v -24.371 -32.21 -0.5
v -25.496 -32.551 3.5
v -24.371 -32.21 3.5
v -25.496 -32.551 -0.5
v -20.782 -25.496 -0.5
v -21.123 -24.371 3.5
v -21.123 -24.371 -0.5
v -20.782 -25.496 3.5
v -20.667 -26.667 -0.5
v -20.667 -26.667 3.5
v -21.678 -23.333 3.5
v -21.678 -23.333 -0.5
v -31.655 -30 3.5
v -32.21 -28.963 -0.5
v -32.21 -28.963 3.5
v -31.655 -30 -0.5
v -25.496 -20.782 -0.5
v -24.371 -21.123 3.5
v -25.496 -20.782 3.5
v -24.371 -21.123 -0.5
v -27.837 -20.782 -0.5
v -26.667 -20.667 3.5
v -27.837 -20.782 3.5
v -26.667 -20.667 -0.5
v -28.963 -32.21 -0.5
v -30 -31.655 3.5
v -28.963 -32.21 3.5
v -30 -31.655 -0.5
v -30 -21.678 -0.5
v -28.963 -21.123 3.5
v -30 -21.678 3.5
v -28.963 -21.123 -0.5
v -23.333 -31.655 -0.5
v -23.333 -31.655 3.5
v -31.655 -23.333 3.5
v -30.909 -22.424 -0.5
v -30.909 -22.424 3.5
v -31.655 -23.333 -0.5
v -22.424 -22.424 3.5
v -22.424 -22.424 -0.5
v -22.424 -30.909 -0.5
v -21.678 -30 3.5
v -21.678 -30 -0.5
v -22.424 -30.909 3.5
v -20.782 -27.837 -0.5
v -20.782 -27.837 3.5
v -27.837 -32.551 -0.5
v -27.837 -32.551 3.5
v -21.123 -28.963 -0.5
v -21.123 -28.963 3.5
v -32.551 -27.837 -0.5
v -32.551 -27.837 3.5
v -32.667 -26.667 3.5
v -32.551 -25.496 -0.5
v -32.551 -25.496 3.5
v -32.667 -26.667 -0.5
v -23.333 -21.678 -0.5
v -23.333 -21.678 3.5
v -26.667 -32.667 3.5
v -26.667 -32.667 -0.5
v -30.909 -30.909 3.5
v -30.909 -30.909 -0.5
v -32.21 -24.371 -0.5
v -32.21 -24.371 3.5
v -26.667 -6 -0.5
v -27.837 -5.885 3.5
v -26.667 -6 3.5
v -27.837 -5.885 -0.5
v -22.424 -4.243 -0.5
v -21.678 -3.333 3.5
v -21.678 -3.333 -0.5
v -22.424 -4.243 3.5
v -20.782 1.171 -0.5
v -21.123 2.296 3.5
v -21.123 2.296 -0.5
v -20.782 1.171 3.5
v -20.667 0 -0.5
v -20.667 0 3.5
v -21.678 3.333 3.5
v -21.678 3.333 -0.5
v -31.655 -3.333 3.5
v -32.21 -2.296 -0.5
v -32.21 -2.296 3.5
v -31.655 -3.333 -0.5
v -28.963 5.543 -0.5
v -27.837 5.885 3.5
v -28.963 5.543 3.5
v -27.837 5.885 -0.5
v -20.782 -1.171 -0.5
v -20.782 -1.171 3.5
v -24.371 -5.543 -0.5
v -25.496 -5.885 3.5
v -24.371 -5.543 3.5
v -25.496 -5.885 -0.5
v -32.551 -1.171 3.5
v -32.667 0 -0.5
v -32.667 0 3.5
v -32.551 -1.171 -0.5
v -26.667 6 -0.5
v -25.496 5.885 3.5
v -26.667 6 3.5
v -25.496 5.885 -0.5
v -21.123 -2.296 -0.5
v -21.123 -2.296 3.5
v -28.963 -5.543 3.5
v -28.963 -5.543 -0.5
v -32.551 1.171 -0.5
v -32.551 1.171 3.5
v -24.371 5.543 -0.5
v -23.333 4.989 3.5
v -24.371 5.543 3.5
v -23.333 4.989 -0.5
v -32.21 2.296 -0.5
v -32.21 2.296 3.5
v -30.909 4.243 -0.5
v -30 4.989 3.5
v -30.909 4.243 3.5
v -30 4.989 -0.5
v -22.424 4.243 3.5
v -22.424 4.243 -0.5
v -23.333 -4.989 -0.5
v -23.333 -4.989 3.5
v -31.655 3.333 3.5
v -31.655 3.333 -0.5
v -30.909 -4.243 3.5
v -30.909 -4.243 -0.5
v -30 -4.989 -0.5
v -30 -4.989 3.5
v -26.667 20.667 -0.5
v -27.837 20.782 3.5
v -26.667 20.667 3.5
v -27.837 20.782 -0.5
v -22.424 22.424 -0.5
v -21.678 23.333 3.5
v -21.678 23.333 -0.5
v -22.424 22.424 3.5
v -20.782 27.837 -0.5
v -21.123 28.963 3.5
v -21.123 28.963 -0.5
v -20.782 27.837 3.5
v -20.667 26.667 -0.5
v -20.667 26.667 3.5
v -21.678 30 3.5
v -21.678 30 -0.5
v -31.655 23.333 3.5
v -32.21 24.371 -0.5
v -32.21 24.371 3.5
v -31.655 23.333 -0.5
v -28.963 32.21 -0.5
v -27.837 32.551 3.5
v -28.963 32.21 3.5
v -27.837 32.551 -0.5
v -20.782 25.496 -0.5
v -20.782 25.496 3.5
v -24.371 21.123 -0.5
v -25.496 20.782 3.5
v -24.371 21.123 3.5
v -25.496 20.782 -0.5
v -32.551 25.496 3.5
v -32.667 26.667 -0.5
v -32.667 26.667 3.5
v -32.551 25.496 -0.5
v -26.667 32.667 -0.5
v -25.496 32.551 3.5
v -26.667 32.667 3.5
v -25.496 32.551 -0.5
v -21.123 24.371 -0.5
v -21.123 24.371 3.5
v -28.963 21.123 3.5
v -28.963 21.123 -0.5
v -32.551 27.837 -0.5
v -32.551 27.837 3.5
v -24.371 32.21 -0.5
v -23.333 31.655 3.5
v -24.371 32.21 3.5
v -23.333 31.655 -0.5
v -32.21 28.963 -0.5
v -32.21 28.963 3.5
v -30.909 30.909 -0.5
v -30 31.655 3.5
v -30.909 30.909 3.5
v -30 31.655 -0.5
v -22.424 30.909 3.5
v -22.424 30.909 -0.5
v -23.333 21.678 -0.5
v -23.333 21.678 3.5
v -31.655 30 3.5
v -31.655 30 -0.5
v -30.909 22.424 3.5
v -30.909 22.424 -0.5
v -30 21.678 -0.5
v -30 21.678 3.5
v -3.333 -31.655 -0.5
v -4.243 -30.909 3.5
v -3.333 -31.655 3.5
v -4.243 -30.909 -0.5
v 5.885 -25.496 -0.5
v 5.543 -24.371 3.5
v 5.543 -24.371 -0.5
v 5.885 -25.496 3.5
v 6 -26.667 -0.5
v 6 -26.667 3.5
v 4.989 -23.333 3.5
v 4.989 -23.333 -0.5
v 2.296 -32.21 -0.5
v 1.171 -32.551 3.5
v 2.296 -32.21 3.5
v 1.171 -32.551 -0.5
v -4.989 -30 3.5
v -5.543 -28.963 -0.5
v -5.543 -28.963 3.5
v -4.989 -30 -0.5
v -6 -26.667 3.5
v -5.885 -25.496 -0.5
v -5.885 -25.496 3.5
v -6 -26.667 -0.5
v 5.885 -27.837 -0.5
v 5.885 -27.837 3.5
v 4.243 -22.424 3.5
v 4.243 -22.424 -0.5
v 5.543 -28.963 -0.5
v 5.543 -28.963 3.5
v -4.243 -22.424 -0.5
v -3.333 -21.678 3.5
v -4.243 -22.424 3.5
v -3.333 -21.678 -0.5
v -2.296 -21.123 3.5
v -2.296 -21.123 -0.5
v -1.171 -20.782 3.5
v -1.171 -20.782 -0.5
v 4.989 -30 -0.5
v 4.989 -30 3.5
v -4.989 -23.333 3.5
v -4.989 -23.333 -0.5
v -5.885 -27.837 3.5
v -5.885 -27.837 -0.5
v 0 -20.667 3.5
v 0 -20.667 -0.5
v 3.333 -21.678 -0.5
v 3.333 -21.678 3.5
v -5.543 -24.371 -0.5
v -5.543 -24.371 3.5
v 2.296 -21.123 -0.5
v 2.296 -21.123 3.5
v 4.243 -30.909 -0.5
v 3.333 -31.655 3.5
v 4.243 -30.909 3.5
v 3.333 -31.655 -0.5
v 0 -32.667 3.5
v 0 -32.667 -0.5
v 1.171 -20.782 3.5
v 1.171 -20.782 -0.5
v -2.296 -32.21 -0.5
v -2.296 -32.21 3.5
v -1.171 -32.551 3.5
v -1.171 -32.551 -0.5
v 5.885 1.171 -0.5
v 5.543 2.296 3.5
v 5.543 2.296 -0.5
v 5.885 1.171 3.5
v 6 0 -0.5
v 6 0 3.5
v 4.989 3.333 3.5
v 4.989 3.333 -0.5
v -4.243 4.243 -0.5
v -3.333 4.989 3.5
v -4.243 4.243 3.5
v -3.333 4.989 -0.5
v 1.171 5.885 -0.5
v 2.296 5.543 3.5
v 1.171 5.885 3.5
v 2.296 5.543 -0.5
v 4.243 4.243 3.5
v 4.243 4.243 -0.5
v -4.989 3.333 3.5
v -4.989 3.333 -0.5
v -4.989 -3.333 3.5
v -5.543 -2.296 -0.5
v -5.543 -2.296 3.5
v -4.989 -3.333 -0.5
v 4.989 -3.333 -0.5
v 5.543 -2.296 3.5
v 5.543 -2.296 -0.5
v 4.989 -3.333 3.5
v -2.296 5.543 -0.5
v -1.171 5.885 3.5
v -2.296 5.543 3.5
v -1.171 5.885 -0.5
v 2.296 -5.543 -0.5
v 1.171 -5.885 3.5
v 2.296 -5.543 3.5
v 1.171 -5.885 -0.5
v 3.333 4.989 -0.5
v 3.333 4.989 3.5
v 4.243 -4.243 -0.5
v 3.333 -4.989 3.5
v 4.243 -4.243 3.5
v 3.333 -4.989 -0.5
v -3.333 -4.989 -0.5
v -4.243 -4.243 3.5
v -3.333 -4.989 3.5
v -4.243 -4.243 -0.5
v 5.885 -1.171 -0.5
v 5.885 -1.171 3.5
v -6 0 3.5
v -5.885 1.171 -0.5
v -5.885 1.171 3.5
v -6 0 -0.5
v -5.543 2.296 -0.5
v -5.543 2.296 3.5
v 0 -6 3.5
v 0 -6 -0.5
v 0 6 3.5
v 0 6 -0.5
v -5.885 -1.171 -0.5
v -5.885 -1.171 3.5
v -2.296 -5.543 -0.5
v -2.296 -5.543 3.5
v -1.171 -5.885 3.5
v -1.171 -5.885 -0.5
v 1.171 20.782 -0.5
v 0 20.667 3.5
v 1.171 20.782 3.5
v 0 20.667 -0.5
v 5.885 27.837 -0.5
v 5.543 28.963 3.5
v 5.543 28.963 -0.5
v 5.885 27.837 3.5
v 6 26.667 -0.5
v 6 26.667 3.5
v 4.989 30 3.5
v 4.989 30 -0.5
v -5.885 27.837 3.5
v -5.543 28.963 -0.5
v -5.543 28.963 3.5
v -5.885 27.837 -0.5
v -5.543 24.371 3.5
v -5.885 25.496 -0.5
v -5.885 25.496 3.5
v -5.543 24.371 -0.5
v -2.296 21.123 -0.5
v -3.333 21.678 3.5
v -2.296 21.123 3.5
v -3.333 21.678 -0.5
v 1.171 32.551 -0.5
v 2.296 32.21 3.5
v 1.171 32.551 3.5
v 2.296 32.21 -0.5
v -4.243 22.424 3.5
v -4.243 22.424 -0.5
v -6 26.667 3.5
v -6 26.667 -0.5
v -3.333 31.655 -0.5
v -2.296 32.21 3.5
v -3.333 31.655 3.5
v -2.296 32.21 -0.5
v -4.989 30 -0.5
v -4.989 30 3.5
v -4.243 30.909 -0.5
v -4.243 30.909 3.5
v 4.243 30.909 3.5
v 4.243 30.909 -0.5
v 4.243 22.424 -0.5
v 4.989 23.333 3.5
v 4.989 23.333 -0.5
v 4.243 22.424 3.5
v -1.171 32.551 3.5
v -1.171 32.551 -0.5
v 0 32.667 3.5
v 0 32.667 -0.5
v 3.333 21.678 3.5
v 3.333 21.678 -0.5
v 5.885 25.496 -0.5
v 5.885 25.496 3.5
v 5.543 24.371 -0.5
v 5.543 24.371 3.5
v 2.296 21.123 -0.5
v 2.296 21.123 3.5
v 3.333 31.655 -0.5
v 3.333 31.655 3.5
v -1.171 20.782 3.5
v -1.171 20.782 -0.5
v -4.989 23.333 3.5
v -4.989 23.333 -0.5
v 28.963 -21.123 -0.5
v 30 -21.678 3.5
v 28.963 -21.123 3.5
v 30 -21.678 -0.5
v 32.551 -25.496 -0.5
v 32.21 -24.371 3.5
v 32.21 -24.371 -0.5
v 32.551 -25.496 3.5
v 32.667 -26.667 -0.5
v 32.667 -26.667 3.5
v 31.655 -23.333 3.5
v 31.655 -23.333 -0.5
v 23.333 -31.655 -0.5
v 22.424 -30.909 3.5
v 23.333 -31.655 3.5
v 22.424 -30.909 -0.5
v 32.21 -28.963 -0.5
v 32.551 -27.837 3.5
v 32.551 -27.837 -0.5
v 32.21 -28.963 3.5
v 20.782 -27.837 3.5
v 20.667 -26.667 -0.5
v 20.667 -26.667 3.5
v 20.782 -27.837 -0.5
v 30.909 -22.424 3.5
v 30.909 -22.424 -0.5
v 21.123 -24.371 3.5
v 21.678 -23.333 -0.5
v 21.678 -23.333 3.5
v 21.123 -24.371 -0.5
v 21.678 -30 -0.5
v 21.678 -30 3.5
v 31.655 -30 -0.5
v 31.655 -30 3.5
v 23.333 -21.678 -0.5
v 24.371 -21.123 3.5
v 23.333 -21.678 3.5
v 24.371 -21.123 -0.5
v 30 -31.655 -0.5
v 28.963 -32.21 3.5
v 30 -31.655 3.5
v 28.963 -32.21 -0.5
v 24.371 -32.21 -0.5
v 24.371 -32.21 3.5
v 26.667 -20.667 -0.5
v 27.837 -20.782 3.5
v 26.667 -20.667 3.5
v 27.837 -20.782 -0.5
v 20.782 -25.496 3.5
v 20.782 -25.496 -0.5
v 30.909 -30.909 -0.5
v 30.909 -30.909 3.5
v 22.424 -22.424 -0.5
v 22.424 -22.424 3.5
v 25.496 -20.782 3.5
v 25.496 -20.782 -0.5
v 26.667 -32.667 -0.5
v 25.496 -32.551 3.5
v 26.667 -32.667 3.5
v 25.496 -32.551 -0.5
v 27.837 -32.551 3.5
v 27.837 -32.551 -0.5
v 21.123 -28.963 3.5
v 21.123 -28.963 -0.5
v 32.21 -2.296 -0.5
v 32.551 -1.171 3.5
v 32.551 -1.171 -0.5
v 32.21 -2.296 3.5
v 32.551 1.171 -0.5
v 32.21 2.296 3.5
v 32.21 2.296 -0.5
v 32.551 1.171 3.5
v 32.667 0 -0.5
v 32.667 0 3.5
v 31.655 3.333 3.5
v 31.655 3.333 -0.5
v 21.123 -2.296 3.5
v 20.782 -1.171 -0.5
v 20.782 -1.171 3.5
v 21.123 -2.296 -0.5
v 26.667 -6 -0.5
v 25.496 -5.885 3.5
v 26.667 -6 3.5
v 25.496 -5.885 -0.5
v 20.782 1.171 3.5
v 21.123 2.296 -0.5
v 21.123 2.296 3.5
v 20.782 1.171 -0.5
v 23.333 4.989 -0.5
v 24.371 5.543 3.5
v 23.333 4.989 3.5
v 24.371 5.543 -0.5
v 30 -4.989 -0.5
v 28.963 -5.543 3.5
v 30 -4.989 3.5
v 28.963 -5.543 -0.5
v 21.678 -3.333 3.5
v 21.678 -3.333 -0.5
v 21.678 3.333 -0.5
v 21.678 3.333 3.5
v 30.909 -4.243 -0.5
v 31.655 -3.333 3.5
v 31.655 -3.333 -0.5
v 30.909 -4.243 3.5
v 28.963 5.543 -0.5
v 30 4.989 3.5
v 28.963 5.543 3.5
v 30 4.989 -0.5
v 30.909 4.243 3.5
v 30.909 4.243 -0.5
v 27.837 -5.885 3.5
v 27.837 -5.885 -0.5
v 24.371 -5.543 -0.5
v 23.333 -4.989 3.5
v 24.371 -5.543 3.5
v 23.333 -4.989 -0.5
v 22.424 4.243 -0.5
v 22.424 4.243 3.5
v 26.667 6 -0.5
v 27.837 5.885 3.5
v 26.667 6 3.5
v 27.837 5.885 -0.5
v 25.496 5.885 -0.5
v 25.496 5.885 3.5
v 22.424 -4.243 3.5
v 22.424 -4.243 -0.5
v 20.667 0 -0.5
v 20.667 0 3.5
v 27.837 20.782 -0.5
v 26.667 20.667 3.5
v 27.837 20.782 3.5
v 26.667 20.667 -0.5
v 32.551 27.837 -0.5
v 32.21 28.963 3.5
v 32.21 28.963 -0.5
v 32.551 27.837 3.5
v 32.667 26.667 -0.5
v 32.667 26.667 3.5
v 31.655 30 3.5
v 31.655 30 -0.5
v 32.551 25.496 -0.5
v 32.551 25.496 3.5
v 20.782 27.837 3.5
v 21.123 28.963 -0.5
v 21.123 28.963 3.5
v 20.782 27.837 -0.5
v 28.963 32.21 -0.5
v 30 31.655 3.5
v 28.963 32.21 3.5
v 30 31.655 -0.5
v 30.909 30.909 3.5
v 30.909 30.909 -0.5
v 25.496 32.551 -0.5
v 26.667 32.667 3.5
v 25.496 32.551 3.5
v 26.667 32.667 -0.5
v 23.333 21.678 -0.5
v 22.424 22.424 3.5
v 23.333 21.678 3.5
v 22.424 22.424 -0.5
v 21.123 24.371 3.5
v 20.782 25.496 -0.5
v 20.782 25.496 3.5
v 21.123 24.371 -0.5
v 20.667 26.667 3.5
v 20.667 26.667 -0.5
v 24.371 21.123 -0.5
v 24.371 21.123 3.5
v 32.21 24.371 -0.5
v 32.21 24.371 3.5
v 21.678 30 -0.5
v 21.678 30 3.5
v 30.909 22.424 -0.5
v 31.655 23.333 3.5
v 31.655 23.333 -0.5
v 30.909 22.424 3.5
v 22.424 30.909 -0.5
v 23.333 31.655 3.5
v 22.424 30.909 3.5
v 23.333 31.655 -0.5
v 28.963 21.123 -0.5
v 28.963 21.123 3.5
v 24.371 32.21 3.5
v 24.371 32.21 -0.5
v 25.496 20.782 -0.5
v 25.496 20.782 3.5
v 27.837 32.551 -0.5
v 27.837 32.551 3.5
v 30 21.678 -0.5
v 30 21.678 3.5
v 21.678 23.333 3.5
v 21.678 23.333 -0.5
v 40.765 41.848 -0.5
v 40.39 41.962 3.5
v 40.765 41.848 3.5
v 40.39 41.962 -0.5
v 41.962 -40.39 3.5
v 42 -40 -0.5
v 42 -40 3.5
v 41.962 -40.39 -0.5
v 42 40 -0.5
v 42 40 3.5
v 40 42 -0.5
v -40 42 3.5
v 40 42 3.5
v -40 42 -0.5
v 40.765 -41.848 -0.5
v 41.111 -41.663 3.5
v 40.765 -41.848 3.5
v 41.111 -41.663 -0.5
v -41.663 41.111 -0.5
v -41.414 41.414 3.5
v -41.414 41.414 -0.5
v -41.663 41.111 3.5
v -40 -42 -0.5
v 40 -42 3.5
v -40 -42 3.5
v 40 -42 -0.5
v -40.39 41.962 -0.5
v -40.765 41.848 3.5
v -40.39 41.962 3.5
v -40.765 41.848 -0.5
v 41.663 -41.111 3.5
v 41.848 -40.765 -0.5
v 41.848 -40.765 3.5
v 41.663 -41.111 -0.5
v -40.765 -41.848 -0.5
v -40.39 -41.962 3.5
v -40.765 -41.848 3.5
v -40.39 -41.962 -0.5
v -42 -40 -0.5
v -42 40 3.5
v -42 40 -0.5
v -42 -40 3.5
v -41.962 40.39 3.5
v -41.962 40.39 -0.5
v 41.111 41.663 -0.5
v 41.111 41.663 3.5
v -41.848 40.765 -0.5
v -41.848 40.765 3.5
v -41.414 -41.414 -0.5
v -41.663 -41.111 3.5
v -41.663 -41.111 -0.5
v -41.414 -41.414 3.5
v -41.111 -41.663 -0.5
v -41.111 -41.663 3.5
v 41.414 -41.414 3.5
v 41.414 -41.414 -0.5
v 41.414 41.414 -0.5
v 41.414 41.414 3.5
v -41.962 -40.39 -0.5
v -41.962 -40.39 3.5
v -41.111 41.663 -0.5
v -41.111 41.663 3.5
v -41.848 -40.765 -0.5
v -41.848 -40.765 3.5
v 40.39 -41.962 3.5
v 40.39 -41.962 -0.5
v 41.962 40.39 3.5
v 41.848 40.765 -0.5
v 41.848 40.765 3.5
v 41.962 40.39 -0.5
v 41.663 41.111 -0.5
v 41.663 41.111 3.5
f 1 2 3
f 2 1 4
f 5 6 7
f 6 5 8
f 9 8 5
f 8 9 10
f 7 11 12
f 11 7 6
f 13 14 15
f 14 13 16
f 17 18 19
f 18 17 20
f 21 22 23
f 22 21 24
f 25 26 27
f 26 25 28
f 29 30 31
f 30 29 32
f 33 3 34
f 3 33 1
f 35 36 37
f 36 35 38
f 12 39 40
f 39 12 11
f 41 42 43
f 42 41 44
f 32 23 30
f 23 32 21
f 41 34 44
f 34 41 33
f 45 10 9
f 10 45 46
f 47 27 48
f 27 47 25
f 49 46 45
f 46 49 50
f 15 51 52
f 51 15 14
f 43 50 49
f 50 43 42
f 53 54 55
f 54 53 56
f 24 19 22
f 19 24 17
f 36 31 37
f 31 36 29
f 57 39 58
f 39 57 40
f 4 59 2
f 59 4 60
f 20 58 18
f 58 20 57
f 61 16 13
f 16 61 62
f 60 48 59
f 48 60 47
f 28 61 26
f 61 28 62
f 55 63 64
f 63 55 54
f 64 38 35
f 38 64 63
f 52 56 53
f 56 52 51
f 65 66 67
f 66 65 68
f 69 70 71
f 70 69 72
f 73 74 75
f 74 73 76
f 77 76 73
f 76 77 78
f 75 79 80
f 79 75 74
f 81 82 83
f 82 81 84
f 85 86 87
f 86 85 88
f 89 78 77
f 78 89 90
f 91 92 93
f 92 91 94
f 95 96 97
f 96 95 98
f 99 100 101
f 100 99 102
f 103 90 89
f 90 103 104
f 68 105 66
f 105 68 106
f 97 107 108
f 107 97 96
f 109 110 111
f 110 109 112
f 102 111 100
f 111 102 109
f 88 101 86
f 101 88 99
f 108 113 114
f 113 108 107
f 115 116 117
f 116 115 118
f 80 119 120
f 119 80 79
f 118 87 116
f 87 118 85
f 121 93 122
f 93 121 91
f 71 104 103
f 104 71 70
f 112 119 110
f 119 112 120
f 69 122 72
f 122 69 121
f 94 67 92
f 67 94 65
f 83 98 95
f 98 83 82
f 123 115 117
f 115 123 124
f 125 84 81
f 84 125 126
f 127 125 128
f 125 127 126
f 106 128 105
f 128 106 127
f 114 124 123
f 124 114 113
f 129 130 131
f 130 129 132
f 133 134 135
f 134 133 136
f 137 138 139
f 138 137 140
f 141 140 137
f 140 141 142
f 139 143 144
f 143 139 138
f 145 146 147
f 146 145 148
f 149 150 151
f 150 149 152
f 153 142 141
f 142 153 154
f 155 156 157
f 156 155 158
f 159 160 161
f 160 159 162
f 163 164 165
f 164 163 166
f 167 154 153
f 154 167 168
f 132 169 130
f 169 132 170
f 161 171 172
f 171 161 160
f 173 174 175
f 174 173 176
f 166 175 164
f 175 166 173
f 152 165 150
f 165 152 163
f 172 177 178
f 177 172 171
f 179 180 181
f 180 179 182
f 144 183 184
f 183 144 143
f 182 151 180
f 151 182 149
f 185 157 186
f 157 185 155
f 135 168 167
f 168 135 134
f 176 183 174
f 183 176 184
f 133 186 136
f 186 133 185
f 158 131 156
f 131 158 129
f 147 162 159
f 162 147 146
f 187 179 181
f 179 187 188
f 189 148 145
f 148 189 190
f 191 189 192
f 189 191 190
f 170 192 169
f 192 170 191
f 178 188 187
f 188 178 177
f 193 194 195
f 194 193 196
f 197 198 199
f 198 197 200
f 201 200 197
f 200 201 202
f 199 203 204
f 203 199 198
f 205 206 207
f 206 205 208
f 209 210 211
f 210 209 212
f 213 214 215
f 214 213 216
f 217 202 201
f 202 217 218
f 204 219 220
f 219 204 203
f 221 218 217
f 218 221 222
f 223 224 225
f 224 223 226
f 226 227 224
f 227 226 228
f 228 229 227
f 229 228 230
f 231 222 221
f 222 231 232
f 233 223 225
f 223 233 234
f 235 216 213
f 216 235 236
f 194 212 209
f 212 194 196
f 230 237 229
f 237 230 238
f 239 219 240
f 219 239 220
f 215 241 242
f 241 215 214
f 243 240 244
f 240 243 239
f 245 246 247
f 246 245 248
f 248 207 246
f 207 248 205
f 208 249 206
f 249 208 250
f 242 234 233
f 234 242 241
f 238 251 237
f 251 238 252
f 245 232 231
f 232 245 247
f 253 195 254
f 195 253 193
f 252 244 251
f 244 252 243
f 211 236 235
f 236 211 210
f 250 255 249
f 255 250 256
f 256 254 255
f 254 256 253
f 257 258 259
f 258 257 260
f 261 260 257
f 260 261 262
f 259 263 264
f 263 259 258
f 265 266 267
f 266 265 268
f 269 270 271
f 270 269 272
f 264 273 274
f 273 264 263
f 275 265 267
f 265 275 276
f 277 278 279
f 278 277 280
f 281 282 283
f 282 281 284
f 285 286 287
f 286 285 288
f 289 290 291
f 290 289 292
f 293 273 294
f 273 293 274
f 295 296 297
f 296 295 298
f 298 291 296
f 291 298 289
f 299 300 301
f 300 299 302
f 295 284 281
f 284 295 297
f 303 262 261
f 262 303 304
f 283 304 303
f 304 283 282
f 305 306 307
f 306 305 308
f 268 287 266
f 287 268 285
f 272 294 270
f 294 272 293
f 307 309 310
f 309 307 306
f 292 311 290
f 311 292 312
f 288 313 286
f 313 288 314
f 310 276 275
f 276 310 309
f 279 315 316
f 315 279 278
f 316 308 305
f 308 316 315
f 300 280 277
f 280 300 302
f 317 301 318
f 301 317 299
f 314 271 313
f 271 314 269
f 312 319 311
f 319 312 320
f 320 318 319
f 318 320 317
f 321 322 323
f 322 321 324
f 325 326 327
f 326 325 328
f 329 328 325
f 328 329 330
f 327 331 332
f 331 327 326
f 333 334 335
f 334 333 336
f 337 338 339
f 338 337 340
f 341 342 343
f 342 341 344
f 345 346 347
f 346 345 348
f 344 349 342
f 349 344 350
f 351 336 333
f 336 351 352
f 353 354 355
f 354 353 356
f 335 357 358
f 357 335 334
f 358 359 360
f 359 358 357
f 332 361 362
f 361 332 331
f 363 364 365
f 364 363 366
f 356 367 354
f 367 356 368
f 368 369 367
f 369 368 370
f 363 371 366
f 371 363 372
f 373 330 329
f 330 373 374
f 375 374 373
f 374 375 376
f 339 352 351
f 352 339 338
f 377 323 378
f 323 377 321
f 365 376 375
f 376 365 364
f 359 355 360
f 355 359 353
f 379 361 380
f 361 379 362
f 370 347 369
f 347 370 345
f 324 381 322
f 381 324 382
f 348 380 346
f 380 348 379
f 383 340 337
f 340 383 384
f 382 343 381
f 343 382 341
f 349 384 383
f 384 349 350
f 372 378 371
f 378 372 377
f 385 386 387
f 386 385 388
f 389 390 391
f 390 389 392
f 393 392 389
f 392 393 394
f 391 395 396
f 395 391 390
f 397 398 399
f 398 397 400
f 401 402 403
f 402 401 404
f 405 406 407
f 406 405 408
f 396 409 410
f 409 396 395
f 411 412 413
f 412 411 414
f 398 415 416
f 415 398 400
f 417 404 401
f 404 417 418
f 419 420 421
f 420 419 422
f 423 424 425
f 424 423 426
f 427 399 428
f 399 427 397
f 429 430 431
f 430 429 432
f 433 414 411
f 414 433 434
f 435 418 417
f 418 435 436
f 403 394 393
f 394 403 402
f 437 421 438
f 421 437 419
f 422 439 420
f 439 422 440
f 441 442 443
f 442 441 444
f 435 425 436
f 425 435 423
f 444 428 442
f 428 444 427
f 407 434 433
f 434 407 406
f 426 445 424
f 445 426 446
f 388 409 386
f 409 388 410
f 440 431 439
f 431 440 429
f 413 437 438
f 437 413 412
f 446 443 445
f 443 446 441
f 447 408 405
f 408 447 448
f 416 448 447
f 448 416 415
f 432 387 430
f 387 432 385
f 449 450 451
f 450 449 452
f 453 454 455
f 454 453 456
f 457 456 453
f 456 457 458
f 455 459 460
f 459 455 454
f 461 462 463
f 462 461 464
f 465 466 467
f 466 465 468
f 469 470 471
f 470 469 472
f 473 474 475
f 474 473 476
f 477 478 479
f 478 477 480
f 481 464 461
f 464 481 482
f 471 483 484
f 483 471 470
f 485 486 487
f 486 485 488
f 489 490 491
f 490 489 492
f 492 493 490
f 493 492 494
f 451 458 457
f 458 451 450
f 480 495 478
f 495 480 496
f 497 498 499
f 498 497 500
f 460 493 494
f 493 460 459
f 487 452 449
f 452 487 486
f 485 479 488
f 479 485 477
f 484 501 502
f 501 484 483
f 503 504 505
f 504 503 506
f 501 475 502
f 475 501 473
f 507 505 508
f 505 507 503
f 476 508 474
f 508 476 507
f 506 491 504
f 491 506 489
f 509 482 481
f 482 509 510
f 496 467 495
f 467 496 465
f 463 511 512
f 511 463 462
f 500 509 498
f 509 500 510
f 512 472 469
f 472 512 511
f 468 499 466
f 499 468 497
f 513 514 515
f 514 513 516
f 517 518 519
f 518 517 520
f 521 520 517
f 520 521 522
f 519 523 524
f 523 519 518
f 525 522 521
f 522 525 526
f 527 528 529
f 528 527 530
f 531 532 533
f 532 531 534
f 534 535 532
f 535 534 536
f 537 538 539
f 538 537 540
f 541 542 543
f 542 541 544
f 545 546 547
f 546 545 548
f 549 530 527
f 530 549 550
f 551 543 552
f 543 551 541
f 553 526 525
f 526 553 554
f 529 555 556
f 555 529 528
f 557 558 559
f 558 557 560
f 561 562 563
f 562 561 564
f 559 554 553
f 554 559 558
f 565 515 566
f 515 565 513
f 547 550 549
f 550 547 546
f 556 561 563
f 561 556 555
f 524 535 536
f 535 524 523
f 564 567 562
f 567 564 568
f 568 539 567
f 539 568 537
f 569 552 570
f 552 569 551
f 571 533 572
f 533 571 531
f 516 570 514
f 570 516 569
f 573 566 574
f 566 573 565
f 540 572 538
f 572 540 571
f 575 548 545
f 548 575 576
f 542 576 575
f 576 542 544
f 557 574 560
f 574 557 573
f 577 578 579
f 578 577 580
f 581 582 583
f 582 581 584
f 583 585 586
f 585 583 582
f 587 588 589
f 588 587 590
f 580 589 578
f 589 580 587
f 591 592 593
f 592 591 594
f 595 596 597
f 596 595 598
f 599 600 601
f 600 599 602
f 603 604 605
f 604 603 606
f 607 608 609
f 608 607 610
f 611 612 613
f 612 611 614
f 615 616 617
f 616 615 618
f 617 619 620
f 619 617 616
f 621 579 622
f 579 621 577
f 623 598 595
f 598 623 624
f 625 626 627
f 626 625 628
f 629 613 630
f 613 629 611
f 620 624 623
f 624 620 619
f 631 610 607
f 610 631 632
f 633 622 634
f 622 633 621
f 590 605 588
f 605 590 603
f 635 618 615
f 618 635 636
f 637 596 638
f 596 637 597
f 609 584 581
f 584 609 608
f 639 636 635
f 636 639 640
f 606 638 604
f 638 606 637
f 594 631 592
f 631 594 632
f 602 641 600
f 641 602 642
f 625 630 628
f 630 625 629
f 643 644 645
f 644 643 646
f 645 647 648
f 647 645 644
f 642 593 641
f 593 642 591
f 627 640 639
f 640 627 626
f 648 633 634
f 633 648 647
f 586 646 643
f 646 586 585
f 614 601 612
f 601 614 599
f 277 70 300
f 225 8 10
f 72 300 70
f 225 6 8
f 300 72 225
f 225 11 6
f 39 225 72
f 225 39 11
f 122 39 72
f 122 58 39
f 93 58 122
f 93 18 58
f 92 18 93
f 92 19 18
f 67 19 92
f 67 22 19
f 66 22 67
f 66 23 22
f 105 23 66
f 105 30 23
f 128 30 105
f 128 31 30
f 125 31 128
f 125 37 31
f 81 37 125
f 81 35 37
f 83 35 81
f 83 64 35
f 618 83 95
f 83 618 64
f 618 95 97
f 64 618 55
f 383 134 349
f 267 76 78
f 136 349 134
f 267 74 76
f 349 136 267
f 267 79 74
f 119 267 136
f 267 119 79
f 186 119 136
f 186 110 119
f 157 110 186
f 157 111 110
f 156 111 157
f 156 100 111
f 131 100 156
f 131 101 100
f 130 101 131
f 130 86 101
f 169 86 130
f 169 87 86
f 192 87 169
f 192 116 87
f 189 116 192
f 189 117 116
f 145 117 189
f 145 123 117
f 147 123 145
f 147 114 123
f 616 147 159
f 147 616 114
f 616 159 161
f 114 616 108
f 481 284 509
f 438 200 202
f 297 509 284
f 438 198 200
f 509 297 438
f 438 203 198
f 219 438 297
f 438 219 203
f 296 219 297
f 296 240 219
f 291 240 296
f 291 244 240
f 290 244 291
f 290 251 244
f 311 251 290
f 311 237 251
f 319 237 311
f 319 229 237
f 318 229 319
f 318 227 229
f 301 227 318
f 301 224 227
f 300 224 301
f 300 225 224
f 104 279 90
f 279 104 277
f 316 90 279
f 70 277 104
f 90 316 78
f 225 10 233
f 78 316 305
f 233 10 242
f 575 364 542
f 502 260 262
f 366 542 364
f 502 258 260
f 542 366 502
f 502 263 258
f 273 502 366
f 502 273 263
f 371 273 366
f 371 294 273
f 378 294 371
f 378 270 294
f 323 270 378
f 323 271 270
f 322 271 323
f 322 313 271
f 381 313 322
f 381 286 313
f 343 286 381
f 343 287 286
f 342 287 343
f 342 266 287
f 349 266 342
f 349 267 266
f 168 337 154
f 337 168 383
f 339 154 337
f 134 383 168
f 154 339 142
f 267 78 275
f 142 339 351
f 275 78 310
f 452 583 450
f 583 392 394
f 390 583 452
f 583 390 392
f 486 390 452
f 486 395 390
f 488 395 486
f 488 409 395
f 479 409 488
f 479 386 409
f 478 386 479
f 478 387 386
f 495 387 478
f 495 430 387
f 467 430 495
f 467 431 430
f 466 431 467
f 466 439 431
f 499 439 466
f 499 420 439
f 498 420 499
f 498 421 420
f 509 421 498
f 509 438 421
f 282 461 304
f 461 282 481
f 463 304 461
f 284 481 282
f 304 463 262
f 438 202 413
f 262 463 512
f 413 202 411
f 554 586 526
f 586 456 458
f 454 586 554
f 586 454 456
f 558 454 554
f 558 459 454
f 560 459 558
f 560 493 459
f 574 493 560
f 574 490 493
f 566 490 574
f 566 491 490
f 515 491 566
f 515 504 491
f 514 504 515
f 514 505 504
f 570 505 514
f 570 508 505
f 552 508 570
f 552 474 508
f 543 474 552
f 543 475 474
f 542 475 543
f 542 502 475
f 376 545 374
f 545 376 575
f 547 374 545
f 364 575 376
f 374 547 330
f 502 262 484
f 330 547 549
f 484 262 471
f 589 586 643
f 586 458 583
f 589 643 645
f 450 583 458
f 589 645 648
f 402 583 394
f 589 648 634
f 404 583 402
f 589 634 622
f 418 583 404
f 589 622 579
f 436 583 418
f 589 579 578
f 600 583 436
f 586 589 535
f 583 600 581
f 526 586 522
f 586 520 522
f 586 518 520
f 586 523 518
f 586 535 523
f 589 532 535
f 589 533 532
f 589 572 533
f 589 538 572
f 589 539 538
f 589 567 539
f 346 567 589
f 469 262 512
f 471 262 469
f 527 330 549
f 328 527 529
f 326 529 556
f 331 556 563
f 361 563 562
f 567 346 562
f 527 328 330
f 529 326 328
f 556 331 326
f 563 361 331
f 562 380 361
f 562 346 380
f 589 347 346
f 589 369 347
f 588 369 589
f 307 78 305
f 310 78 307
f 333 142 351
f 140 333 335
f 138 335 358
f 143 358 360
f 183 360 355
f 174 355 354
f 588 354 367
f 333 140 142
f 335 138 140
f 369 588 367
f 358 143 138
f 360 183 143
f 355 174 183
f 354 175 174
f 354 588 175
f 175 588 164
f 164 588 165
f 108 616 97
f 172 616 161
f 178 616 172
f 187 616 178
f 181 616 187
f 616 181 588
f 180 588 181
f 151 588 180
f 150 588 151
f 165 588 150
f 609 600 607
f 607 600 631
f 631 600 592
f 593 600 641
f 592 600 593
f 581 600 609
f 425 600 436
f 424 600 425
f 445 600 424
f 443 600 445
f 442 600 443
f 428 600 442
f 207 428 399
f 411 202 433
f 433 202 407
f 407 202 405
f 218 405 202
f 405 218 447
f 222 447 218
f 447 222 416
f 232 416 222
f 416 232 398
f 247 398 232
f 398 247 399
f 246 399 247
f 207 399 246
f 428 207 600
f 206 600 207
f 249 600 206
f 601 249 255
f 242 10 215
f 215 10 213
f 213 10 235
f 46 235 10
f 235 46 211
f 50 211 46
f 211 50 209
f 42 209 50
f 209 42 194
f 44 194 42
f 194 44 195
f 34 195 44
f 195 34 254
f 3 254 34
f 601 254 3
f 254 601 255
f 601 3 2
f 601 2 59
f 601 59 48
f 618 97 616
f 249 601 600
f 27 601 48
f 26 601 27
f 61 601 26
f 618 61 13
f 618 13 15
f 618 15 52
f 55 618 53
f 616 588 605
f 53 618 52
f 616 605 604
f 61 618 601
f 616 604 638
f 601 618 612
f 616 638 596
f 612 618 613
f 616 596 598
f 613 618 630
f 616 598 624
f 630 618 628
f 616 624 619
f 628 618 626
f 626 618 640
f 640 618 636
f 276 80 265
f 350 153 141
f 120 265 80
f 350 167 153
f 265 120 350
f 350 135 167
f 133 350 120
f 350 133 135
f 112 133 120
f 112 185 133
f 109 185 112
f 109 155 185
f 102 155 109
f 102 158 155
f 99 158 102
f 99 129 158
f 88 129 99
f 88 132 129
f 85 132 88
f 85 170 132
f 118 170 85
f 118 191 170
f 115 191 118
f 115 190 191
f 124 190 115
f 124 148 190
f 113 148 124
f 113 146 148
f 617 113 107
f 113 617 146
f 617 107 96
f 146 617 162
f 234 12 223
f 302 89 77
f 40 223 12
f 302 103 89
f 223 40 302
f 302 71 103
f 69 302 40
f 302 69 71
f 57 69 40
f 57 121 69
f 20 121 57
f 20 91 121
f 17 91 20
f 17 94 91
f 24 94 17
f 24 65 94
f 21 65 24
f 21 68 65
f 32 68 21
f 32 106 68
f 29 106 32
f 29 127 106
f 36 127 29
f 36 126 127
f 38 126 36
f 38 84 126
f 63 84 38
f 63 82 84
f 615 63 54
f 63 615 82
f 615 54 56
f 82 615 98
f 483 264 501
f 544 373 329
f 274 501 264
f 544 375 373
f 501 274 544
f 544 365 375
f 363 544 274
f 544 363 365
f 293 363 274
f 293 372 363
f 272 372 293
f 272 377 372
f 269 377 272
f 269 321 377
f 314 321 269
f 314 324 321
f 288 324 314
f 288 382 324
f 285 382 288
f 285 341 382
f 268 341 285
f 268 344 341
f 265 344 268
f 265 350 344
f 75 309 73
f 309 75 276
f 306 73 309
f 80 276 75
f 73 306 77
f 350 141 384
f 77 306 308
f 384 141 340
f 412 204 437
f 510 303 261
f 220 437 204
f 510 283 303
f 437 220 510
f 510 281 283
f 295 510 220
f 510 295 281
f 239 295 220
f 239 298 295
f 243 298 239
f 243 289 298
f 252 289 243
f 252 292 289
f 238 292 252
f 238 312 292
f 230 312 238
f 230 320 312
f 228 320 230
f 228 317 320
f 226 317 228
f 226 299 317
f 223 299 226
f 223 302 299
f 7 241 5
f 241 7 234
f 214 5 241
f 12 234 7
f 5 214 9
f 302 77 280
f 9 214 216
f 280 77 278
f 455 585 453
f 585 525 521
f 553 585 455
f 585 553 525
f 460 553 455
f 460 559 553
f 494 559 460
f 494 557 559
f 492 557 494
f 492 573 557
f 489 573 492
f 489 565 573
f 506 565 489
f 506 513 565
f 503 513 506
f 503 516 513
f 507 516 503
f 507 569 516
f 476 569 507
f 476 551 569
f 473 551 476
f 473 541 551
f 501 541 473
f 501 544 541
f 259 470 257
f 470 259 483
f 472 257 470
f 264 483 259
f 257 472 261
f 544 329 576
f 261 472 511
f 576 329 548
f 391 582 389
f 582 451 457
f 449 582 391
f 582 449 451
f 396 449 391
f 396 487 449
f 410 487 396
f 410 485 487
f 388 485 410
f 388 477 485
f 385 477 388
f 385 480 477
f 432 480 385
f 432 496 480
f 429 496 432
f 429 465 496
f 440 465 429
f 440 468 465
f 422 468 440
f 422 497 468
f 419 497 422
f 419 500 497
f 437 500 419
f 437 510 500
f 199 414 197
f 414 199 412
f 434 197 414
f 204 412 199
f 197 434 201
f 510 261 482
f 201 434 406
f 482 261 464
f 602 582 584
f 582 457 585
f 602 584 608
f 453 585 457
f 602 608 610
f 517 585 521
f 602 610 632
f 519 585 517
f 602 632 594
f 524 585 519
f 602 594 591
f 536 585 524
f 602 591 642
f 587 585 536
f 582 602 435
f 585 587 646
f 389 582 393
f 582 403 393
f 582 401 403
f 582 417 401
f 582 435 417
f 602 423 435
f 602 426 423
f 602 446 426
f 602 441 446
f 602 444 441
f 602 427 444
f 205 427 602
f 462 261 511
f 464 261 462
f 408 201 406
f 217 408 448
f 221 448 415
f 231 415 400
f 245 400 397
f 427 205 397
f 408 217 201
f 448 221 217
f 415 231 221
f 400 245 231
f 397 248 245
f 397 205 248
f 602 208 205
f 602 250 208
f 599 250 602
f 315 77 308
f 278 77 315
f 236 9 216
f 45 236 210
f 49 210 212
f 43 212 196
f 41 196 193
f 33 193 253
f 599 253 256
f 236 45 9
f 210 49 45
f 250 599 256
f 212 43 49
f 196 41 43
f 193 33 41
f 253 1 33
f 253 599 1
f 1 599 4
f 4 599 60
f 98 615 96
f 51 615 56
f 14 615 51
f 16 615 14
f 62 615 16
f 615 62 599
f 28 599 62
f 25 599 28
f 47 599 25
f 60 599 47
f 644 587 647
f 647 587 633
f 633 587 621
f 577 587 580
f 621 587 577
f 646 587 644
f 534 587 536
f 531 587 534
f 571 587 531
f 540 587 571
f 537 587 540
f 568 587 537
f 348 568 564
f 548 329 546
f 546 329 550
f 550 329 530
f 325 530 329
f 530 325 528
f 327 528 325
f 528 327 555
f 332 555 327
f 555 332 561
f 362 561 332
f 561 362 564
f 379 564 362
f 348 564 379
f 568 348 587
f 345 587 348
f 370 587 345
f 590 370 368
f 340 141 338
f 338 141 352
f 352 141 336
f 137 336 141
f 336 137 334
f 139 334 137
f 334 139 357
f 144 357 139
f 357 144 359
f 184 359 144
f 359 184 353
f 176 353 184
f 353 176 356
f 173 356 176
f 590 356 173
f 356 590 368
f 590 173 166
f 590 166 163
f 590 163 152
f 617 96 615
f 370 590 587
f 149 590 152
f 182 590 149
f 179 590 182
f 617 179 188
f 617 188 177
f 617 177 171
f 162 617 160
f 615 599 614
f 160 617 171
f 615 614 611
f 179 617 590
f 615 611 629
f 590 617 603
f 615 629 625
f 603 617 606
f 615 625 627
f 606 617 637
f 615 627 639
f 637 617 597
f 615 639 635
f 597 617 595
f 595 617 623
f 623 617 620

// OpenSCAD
square_width = 80;

$fn=32;
difference()
{
    minkowski() {
        cube([square_width,square_width,1],center=true);
        cylinder(h=3,r=2);
    }
    union() {
        space = square_width/3;
        for (x = [0:3]) {
            for (y = [0:3]) {
                translate([(x-2)*space,(y-2)*space,0]) cylinder(h=8,r=6,center=true);
        for (a = [0:3]) {
            rotate(45,[0,0,1])
                translate([square_width/2-5,square_width/2-5,0])
                    cylinder(h=8,r=3,center=true);
        }
    }}}
}
